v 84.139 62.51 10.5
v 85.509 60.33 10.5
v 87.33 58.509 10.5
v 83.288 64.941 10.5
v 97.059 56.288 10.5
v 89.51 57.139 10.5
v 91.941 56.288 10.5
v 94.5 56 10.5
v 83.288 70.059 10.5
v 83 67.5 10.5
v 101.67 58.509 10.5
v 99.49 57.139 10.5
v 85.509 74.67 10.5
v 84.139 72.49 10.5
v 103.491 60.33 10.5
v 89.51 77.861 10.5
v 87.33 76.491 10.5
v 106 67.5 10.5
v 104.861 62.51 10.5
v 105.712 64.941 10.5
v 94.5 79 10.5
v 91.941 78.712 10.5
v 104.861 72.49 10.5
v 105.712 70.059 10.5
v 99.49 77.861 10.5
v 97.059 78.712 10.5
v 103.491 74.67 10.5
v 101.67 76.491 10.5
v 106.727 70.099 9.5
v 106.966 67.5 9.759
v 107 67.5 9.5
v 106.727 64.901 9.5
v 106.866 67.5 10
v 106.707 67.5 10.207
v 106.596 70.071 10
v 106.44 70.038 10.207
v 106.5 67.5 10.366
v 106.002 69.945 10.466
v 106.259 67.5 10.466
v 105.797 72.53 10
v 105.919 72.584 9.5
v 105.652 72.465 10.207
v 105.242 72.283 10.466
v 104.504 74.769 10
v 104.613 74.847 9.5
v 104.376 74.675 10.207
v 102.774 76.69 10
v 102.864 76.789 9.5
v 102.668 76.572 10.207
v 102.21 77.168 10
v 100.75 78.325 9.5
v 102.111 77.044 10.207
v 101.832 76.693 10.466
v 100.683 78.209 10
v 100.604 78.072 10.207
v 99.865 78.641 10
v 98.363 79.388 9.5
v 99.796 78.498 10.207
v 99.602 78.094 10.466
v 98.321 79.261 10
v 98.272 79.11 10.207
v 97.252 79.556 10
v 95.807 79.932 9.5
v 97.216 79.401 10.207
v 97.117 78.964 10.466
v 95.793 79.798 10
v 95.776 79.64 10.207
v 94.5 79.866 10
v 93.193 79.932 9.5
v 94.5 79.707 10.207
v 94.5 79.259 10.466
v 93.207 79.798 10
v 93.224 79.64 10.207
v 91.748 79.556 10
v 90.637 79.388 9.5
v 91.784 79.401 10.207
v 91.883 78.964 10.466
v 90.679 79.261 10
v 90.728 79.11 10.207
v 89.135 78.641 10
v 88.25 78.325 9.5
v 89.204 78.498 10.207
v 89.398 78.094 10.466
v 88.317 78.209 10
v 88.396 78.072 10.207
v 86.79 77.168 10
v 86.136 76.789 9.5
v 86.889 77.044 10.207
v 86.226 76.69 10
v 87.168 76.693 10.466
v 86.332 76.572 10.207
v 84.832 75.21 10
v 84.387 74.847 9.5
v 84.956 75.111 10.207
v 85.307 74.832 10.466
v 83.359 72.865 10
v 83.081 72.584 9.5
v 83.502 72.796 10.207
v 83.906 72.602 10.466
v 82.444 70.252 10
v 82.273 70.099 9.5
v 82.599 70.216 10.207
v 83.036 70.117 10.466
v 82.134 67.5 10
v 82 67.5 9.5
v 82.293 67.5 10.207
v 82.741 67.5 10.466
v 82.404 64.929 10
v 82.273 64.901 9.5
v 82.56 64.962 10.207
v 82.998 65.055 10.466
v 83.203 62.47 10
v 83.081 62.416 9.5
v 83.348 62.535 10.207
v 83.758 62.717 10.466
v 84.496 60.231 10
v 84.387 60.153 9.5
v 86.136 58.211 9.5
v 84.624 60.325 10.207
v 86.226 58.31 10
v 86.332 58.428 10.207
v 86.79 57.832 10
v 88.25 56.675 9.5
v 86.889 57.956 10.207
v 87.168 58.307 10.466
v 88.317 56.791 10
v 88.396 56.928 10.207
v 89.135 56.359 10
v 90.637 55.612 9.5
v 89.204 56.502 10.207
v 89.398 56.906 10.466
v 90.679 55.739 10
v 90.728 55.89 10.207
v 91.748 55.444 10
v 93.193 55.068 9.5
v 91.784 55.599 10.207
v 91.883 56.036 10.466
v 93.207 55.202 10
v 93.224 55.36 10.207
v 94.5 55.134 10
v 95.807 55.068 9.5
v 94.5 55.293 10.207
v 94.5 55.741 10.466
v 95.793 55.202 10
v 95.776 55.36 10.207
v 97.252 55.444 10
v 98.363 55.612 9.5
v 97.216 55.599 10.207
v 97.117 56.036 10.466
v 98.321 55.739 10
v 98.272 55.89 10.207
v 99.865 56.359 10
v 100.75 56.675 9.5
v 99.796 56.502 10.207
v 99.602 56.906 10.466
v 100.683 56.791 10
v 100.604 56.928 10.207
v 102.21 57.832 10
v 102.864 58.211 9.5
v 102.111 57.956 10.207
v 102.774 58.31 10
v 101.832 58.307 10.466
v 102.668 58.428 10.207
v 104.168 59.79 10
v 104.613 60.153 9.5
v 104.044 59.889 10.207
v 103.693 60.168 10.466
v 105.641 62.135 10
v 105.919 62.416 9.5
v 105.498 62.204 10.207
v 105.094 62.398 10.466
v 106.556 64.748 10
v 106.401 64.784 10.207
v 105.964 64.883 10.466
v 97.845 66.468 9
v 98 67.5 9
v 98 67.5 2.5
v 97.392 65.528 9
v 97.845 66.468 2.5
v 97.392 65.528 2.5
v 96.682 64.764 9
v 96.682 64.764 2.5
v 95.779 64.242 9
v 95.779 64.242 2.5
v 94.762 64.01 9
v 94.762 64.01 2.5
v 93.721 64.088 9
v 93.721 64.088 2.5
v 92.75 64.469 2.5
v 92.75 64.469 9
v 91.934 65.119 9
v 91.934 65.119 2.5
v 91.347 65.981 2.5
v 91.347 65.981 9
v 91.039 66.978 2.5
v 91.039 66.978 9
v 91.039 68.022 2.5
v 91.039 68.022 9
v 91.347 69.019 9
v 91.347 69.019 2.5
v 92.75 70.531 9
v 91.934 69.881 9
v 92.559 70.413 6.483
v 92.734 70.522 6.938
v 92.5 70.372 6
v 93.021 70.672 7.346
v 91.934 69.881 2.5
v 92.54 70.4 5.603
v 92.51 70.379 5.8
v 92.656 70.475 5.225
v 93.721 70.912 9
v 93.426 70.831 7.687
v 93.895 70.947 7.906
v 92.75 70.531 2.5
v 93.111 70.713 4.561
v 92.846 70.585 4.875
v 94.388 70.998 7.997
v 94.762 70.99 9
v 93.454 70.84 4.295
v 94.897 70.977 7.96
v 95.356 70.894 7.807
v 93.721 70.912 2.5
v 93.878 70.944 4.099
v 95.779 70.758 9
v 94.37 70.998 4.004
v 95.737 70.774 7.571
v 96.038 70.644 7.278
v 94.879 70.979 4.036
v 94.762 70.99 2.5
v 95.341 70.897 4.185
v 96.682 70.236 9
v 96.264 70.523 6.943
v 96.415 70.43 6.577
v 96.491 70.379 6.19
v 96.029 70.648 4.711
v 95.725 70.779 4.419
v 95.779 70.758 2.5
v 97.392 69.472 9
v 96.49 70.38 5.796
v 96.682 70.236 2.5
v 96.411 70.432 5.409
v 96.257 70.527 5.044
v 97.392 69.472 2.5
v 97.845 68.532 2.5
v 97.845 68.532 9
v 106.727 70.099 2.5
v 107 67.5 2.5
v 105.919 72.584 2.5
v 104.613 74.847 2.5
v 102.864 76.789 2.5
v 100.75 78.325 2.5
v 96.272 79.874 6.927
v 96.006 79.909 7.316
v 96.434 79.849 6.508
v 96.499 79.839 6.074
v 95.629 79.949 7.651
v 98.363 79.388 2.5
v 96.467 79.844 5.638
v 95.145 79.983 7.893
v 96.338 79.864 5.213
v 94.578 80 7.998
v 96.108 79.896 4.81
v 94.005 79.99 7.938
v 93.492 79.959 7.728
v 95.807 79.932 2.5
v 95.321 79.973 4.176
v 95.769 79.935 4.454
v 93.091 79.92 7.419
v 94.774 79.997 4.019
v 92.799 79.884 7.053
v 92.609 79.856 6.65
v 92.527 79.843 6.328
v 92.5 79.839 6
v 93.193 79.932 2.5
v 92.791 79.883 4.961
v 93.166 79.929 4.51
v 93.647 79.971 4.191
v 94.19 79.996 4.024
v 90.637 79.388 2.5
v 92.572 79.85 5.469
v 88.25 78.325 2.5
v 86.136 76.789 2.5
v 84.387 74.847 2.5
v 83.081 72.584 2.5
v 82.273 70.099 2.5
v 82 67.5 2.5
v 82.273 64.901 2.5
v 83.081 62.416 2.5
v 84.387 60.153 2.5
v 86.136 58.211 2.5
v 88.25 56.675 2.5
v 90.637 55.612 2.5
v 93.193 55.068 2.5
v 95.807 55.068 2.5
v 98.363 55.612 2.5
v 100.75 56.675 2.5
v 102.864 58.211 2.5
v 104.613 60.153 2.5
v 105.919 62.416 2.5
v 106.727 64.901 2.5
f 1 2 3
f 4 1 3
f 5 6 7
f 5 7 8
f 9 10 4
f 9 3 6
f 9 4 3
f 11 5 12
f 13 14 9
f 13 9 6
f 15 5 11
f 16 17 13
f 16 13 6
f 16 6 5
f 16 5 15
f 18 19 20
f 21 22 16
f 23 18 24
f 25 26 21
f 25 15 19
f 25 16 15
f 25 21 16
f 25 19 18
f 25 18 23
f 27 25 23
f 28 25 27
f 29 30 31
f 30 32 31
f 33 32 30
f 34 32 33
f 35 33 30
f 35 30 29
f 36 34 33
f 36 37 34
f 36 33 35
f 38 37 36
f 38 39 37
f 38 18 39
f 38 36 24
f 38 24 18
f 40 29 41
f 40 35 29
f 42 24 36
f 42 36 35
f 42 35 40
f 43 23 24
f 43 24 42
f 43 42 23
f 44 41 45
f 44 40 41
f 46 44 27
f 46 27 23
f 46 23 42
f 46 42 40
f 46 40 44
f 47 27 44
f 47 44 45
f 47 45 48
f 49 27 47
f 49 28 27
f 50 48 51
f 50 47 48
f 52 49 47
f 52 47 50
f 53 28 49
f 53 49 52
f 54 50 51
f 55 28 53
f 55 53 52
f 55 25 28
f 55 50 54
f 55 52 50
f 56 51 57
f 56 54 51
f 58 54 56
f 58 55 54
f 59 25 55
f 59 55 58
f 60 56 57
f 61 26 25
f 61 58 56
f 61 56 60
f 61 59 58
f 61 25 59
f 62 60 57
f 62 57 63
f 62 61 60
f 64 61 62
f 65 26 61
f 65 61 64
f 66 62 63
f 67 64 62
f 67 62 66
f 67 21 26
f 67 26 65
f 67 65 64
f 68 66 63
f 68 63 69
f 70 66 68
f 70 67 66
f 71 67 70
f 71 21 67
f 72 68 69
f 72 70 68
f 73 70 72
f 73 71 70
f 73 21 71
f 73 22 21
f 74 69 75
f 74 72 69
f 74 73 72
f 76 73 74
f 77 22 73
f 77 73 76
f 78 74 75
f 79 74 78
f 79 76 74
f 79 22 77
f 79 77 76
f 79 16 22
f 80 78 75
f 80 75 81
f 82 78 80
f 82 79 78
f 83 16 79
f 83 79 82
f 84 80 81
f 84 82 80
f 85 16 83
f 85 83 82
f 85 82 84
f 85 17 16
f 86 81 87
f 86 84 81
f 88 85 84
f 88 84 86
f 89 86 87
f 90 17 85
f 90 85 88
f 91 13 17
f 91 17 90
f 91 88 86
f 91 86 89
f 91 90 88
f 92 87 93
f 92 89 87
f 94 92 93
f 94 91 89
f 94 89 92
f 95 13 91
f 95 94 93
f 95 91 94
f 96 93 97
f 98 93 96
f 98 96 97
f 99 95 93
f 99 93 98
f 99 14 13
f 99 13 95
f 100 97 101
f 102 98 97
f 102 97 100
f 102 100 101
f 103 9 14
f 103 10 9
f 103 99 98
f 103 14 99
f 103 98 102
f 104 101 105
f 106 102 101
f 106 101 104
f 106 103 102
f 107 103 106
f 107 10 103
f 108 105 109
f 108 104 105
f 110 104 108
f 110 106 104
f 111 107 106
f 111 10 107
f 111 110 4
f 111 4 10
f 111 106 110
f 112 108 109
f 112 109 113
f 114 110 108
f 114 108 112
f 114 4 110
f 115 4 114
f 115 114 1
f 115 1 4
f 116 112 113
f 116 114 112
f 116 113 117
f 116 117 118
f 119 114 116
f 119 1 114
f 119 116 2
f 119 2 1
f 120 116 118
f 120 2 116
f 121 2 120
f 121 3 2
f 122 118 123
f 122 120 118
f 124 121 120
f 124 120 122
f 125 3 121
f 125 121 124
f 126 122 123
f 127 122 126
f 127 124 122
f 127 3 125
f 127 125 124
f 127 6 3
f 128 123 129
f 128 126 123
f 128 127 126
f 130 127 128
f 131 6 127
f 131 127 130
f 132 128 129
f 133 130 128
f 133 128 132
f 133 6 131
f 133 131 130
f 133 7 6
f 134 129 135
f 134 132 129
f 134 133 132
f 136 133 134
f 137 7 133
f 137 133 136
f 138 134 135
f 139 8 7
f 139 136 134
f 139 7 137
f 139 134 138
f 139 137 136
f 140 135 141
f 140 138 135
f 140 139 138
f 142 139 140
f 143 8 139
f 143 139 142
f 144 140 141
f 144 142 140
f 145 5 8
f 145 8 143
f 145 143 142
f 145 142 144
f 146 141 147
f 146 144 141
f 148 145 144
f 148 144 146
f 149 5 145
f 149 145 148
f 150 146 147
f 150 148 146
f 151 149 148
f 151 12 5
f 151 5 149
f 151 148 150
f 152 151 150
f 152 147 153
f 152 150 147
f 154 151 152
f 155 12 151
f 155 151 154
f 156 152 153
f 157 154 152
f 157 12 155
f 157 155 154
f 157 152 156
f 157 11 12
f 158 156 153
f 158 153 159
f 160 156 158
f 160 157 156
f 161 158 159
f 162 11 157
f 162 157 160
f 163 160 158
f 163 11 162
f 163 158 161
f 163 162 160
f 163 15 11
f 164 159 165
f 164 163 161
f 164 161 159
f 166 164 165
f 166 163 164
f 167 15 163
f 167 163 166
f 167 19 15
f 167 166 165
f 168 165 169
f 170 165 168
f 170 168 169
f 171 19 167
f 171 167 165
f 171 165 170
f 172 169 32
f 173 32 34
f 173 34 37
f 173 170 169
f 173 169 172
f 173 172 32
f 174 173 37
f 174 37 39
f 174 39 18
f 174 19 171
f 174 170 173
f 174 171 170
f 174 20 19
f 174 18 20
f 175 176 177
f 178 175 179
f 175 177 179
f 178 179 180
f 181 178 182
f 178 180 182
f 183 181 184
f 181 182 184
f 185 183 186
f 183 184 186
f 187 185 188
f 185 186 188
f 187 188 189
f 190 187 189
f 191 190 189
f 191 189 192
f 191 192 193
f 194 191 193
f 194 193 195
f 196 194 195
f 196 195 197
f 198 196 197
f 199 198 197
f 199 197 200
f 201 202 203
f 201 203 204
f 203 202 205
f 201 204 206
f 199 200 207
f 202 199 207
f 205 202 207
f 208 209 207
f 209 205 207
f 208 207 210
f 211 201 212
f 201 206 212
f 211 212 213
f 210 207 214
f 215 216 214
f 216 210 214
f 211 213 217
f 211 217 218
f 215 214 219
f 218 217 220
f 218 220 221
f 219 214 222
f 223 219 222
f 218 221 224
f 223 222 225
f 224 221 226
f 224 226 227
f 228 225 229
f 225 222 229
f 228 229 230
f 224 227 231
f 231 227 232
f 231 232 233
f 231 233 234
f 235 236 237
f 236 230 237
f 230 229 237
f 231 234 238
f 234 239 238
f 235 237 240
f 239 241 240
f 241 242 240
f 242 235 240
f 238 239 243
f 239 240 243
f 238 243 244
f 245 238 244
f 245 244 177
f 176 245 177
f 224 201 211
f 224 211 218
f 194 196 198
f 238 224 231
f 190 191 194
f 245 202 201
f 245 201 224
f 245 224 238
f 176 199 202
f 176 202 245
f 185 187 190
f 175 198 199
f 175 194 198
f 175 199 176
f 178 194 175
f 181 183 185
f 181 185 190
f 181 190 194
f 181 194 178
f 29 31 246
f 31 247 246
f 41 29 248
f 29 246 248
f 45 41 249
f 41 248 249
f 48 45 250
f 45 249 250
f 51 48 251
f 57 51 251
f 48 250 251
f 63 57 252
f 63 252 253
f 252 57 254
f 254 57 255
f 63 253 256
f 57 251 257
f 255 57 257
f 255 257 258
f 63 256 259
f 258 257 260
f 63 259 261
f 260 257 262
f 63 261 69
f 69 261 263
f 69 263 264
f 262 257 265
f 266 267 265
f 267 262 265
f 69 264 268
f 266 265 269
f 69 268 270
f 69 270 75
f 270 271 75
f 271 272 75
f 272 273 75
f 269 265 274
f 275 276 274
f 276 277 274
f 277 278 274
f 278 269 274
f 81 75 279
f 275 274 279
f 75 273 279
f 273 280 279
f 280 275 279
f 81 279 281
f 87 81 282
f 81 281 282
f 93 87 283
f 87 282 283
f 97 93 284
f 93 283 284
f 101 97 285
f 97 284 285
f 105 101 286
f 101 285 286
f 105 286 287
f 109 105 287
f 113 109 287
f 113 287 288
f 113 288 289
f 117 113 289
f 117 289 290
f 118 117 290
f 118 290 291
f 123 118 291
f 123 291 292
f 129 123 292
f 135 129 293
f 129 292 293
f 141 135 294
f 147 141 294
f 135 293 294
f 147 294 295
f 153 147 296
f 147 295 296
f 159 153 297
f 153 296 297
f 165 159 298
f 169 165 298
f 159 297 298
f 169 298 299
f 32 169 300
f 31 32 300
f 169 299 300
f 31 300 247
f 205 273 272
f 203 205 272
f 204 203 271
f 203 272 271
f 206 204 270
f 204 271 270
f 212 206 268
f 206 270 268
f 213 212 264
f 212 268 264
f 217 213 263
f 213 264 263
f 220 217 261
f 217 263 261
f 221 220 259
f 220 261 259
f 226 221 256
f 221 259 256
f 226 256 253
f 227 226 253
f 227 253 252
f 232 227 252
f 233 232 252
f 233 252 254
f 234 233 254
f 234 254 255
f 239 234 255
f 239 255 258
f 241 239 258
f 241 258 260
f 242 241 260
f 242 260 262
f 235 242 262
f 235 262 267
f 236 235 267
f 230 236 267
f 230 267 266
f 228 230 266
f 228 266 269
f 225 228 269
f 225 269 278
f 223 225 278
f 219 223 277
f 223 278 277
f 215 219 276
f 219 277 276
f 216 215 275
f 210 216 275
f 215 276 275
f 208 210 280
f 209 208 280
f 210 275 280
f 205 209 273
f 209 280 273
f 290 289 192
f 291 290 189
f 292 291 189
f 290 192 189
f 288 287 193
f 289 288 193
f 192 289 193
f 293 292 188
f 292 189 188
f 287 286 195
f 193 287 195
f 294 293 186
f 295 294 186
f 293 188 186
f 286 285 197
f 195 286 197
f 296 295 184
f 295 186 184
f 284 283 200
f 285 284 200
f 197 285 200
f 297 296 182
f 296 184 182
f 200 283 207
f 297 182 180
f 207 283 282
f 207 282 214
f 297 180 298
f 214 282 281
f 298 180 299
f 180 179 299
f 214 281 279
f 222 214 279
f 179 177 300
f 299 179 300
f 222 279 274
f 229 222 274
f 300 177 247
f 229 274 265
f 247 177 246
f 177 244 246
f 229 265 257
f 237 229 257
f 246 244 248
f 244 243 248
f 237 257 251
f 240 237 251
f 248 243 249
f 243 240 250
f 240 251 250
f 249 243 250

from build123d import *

# Parameters (mm, degrees)
SKETCH059_R     = 12.5
PAD030_DEPTH    = 8
SKETCH060_R     = 3.5
POCKET029_DEPTH = 6.5
FILLET003_R     = 1
SKETCH061_R     = 2
POCKET030_DEPTH = 10


with BuildPart() as part:
    # Sketch059 → Pad030 (new body)
    with BuildSketch(Plane.XY):
        Circle(SKETCH059_R)
    extrude(amount=PAD030_DEPTH)

    # Sketch060 (on Face2 of Pad030) → Pocket029 (cut)
    with BuildSketch(Plane(origin=(0, 0, 0), x_dir=(1, 0, 0), z_dir=(0, 0, -1))):
        Circle(SKETCH060_R)
    extrude(amount=-POCKET029_DEPTH, mode=Mode.SUBTRACT)

    # Fillet003
    fillet003_edges = [part.edges().sort_by_distance(p)[0] for p in [
        (-12.5, 0, 8),
    ]]
    fillet(fillet003_edges, radius=FILLET003_R)

    # Sketch061 (on DatumPlane) → Pocket030 (cut)
    with BuildSketch(Plane(origin=(0, 12.5, 3.5), x_dir=(-1, 0, 0), z_dir=(0, 1, 0))):
        Circle(SKETCH061_R)
    extrude(amount=-POCKET030_DEPTH, mode=Mode.SUBTRACT)


with BuildPart() as part_1:
    # Body015 placement: moved
    add(part.part.moved(Location((94.5, 67.5, 2.5))))


solid = part_1.part
